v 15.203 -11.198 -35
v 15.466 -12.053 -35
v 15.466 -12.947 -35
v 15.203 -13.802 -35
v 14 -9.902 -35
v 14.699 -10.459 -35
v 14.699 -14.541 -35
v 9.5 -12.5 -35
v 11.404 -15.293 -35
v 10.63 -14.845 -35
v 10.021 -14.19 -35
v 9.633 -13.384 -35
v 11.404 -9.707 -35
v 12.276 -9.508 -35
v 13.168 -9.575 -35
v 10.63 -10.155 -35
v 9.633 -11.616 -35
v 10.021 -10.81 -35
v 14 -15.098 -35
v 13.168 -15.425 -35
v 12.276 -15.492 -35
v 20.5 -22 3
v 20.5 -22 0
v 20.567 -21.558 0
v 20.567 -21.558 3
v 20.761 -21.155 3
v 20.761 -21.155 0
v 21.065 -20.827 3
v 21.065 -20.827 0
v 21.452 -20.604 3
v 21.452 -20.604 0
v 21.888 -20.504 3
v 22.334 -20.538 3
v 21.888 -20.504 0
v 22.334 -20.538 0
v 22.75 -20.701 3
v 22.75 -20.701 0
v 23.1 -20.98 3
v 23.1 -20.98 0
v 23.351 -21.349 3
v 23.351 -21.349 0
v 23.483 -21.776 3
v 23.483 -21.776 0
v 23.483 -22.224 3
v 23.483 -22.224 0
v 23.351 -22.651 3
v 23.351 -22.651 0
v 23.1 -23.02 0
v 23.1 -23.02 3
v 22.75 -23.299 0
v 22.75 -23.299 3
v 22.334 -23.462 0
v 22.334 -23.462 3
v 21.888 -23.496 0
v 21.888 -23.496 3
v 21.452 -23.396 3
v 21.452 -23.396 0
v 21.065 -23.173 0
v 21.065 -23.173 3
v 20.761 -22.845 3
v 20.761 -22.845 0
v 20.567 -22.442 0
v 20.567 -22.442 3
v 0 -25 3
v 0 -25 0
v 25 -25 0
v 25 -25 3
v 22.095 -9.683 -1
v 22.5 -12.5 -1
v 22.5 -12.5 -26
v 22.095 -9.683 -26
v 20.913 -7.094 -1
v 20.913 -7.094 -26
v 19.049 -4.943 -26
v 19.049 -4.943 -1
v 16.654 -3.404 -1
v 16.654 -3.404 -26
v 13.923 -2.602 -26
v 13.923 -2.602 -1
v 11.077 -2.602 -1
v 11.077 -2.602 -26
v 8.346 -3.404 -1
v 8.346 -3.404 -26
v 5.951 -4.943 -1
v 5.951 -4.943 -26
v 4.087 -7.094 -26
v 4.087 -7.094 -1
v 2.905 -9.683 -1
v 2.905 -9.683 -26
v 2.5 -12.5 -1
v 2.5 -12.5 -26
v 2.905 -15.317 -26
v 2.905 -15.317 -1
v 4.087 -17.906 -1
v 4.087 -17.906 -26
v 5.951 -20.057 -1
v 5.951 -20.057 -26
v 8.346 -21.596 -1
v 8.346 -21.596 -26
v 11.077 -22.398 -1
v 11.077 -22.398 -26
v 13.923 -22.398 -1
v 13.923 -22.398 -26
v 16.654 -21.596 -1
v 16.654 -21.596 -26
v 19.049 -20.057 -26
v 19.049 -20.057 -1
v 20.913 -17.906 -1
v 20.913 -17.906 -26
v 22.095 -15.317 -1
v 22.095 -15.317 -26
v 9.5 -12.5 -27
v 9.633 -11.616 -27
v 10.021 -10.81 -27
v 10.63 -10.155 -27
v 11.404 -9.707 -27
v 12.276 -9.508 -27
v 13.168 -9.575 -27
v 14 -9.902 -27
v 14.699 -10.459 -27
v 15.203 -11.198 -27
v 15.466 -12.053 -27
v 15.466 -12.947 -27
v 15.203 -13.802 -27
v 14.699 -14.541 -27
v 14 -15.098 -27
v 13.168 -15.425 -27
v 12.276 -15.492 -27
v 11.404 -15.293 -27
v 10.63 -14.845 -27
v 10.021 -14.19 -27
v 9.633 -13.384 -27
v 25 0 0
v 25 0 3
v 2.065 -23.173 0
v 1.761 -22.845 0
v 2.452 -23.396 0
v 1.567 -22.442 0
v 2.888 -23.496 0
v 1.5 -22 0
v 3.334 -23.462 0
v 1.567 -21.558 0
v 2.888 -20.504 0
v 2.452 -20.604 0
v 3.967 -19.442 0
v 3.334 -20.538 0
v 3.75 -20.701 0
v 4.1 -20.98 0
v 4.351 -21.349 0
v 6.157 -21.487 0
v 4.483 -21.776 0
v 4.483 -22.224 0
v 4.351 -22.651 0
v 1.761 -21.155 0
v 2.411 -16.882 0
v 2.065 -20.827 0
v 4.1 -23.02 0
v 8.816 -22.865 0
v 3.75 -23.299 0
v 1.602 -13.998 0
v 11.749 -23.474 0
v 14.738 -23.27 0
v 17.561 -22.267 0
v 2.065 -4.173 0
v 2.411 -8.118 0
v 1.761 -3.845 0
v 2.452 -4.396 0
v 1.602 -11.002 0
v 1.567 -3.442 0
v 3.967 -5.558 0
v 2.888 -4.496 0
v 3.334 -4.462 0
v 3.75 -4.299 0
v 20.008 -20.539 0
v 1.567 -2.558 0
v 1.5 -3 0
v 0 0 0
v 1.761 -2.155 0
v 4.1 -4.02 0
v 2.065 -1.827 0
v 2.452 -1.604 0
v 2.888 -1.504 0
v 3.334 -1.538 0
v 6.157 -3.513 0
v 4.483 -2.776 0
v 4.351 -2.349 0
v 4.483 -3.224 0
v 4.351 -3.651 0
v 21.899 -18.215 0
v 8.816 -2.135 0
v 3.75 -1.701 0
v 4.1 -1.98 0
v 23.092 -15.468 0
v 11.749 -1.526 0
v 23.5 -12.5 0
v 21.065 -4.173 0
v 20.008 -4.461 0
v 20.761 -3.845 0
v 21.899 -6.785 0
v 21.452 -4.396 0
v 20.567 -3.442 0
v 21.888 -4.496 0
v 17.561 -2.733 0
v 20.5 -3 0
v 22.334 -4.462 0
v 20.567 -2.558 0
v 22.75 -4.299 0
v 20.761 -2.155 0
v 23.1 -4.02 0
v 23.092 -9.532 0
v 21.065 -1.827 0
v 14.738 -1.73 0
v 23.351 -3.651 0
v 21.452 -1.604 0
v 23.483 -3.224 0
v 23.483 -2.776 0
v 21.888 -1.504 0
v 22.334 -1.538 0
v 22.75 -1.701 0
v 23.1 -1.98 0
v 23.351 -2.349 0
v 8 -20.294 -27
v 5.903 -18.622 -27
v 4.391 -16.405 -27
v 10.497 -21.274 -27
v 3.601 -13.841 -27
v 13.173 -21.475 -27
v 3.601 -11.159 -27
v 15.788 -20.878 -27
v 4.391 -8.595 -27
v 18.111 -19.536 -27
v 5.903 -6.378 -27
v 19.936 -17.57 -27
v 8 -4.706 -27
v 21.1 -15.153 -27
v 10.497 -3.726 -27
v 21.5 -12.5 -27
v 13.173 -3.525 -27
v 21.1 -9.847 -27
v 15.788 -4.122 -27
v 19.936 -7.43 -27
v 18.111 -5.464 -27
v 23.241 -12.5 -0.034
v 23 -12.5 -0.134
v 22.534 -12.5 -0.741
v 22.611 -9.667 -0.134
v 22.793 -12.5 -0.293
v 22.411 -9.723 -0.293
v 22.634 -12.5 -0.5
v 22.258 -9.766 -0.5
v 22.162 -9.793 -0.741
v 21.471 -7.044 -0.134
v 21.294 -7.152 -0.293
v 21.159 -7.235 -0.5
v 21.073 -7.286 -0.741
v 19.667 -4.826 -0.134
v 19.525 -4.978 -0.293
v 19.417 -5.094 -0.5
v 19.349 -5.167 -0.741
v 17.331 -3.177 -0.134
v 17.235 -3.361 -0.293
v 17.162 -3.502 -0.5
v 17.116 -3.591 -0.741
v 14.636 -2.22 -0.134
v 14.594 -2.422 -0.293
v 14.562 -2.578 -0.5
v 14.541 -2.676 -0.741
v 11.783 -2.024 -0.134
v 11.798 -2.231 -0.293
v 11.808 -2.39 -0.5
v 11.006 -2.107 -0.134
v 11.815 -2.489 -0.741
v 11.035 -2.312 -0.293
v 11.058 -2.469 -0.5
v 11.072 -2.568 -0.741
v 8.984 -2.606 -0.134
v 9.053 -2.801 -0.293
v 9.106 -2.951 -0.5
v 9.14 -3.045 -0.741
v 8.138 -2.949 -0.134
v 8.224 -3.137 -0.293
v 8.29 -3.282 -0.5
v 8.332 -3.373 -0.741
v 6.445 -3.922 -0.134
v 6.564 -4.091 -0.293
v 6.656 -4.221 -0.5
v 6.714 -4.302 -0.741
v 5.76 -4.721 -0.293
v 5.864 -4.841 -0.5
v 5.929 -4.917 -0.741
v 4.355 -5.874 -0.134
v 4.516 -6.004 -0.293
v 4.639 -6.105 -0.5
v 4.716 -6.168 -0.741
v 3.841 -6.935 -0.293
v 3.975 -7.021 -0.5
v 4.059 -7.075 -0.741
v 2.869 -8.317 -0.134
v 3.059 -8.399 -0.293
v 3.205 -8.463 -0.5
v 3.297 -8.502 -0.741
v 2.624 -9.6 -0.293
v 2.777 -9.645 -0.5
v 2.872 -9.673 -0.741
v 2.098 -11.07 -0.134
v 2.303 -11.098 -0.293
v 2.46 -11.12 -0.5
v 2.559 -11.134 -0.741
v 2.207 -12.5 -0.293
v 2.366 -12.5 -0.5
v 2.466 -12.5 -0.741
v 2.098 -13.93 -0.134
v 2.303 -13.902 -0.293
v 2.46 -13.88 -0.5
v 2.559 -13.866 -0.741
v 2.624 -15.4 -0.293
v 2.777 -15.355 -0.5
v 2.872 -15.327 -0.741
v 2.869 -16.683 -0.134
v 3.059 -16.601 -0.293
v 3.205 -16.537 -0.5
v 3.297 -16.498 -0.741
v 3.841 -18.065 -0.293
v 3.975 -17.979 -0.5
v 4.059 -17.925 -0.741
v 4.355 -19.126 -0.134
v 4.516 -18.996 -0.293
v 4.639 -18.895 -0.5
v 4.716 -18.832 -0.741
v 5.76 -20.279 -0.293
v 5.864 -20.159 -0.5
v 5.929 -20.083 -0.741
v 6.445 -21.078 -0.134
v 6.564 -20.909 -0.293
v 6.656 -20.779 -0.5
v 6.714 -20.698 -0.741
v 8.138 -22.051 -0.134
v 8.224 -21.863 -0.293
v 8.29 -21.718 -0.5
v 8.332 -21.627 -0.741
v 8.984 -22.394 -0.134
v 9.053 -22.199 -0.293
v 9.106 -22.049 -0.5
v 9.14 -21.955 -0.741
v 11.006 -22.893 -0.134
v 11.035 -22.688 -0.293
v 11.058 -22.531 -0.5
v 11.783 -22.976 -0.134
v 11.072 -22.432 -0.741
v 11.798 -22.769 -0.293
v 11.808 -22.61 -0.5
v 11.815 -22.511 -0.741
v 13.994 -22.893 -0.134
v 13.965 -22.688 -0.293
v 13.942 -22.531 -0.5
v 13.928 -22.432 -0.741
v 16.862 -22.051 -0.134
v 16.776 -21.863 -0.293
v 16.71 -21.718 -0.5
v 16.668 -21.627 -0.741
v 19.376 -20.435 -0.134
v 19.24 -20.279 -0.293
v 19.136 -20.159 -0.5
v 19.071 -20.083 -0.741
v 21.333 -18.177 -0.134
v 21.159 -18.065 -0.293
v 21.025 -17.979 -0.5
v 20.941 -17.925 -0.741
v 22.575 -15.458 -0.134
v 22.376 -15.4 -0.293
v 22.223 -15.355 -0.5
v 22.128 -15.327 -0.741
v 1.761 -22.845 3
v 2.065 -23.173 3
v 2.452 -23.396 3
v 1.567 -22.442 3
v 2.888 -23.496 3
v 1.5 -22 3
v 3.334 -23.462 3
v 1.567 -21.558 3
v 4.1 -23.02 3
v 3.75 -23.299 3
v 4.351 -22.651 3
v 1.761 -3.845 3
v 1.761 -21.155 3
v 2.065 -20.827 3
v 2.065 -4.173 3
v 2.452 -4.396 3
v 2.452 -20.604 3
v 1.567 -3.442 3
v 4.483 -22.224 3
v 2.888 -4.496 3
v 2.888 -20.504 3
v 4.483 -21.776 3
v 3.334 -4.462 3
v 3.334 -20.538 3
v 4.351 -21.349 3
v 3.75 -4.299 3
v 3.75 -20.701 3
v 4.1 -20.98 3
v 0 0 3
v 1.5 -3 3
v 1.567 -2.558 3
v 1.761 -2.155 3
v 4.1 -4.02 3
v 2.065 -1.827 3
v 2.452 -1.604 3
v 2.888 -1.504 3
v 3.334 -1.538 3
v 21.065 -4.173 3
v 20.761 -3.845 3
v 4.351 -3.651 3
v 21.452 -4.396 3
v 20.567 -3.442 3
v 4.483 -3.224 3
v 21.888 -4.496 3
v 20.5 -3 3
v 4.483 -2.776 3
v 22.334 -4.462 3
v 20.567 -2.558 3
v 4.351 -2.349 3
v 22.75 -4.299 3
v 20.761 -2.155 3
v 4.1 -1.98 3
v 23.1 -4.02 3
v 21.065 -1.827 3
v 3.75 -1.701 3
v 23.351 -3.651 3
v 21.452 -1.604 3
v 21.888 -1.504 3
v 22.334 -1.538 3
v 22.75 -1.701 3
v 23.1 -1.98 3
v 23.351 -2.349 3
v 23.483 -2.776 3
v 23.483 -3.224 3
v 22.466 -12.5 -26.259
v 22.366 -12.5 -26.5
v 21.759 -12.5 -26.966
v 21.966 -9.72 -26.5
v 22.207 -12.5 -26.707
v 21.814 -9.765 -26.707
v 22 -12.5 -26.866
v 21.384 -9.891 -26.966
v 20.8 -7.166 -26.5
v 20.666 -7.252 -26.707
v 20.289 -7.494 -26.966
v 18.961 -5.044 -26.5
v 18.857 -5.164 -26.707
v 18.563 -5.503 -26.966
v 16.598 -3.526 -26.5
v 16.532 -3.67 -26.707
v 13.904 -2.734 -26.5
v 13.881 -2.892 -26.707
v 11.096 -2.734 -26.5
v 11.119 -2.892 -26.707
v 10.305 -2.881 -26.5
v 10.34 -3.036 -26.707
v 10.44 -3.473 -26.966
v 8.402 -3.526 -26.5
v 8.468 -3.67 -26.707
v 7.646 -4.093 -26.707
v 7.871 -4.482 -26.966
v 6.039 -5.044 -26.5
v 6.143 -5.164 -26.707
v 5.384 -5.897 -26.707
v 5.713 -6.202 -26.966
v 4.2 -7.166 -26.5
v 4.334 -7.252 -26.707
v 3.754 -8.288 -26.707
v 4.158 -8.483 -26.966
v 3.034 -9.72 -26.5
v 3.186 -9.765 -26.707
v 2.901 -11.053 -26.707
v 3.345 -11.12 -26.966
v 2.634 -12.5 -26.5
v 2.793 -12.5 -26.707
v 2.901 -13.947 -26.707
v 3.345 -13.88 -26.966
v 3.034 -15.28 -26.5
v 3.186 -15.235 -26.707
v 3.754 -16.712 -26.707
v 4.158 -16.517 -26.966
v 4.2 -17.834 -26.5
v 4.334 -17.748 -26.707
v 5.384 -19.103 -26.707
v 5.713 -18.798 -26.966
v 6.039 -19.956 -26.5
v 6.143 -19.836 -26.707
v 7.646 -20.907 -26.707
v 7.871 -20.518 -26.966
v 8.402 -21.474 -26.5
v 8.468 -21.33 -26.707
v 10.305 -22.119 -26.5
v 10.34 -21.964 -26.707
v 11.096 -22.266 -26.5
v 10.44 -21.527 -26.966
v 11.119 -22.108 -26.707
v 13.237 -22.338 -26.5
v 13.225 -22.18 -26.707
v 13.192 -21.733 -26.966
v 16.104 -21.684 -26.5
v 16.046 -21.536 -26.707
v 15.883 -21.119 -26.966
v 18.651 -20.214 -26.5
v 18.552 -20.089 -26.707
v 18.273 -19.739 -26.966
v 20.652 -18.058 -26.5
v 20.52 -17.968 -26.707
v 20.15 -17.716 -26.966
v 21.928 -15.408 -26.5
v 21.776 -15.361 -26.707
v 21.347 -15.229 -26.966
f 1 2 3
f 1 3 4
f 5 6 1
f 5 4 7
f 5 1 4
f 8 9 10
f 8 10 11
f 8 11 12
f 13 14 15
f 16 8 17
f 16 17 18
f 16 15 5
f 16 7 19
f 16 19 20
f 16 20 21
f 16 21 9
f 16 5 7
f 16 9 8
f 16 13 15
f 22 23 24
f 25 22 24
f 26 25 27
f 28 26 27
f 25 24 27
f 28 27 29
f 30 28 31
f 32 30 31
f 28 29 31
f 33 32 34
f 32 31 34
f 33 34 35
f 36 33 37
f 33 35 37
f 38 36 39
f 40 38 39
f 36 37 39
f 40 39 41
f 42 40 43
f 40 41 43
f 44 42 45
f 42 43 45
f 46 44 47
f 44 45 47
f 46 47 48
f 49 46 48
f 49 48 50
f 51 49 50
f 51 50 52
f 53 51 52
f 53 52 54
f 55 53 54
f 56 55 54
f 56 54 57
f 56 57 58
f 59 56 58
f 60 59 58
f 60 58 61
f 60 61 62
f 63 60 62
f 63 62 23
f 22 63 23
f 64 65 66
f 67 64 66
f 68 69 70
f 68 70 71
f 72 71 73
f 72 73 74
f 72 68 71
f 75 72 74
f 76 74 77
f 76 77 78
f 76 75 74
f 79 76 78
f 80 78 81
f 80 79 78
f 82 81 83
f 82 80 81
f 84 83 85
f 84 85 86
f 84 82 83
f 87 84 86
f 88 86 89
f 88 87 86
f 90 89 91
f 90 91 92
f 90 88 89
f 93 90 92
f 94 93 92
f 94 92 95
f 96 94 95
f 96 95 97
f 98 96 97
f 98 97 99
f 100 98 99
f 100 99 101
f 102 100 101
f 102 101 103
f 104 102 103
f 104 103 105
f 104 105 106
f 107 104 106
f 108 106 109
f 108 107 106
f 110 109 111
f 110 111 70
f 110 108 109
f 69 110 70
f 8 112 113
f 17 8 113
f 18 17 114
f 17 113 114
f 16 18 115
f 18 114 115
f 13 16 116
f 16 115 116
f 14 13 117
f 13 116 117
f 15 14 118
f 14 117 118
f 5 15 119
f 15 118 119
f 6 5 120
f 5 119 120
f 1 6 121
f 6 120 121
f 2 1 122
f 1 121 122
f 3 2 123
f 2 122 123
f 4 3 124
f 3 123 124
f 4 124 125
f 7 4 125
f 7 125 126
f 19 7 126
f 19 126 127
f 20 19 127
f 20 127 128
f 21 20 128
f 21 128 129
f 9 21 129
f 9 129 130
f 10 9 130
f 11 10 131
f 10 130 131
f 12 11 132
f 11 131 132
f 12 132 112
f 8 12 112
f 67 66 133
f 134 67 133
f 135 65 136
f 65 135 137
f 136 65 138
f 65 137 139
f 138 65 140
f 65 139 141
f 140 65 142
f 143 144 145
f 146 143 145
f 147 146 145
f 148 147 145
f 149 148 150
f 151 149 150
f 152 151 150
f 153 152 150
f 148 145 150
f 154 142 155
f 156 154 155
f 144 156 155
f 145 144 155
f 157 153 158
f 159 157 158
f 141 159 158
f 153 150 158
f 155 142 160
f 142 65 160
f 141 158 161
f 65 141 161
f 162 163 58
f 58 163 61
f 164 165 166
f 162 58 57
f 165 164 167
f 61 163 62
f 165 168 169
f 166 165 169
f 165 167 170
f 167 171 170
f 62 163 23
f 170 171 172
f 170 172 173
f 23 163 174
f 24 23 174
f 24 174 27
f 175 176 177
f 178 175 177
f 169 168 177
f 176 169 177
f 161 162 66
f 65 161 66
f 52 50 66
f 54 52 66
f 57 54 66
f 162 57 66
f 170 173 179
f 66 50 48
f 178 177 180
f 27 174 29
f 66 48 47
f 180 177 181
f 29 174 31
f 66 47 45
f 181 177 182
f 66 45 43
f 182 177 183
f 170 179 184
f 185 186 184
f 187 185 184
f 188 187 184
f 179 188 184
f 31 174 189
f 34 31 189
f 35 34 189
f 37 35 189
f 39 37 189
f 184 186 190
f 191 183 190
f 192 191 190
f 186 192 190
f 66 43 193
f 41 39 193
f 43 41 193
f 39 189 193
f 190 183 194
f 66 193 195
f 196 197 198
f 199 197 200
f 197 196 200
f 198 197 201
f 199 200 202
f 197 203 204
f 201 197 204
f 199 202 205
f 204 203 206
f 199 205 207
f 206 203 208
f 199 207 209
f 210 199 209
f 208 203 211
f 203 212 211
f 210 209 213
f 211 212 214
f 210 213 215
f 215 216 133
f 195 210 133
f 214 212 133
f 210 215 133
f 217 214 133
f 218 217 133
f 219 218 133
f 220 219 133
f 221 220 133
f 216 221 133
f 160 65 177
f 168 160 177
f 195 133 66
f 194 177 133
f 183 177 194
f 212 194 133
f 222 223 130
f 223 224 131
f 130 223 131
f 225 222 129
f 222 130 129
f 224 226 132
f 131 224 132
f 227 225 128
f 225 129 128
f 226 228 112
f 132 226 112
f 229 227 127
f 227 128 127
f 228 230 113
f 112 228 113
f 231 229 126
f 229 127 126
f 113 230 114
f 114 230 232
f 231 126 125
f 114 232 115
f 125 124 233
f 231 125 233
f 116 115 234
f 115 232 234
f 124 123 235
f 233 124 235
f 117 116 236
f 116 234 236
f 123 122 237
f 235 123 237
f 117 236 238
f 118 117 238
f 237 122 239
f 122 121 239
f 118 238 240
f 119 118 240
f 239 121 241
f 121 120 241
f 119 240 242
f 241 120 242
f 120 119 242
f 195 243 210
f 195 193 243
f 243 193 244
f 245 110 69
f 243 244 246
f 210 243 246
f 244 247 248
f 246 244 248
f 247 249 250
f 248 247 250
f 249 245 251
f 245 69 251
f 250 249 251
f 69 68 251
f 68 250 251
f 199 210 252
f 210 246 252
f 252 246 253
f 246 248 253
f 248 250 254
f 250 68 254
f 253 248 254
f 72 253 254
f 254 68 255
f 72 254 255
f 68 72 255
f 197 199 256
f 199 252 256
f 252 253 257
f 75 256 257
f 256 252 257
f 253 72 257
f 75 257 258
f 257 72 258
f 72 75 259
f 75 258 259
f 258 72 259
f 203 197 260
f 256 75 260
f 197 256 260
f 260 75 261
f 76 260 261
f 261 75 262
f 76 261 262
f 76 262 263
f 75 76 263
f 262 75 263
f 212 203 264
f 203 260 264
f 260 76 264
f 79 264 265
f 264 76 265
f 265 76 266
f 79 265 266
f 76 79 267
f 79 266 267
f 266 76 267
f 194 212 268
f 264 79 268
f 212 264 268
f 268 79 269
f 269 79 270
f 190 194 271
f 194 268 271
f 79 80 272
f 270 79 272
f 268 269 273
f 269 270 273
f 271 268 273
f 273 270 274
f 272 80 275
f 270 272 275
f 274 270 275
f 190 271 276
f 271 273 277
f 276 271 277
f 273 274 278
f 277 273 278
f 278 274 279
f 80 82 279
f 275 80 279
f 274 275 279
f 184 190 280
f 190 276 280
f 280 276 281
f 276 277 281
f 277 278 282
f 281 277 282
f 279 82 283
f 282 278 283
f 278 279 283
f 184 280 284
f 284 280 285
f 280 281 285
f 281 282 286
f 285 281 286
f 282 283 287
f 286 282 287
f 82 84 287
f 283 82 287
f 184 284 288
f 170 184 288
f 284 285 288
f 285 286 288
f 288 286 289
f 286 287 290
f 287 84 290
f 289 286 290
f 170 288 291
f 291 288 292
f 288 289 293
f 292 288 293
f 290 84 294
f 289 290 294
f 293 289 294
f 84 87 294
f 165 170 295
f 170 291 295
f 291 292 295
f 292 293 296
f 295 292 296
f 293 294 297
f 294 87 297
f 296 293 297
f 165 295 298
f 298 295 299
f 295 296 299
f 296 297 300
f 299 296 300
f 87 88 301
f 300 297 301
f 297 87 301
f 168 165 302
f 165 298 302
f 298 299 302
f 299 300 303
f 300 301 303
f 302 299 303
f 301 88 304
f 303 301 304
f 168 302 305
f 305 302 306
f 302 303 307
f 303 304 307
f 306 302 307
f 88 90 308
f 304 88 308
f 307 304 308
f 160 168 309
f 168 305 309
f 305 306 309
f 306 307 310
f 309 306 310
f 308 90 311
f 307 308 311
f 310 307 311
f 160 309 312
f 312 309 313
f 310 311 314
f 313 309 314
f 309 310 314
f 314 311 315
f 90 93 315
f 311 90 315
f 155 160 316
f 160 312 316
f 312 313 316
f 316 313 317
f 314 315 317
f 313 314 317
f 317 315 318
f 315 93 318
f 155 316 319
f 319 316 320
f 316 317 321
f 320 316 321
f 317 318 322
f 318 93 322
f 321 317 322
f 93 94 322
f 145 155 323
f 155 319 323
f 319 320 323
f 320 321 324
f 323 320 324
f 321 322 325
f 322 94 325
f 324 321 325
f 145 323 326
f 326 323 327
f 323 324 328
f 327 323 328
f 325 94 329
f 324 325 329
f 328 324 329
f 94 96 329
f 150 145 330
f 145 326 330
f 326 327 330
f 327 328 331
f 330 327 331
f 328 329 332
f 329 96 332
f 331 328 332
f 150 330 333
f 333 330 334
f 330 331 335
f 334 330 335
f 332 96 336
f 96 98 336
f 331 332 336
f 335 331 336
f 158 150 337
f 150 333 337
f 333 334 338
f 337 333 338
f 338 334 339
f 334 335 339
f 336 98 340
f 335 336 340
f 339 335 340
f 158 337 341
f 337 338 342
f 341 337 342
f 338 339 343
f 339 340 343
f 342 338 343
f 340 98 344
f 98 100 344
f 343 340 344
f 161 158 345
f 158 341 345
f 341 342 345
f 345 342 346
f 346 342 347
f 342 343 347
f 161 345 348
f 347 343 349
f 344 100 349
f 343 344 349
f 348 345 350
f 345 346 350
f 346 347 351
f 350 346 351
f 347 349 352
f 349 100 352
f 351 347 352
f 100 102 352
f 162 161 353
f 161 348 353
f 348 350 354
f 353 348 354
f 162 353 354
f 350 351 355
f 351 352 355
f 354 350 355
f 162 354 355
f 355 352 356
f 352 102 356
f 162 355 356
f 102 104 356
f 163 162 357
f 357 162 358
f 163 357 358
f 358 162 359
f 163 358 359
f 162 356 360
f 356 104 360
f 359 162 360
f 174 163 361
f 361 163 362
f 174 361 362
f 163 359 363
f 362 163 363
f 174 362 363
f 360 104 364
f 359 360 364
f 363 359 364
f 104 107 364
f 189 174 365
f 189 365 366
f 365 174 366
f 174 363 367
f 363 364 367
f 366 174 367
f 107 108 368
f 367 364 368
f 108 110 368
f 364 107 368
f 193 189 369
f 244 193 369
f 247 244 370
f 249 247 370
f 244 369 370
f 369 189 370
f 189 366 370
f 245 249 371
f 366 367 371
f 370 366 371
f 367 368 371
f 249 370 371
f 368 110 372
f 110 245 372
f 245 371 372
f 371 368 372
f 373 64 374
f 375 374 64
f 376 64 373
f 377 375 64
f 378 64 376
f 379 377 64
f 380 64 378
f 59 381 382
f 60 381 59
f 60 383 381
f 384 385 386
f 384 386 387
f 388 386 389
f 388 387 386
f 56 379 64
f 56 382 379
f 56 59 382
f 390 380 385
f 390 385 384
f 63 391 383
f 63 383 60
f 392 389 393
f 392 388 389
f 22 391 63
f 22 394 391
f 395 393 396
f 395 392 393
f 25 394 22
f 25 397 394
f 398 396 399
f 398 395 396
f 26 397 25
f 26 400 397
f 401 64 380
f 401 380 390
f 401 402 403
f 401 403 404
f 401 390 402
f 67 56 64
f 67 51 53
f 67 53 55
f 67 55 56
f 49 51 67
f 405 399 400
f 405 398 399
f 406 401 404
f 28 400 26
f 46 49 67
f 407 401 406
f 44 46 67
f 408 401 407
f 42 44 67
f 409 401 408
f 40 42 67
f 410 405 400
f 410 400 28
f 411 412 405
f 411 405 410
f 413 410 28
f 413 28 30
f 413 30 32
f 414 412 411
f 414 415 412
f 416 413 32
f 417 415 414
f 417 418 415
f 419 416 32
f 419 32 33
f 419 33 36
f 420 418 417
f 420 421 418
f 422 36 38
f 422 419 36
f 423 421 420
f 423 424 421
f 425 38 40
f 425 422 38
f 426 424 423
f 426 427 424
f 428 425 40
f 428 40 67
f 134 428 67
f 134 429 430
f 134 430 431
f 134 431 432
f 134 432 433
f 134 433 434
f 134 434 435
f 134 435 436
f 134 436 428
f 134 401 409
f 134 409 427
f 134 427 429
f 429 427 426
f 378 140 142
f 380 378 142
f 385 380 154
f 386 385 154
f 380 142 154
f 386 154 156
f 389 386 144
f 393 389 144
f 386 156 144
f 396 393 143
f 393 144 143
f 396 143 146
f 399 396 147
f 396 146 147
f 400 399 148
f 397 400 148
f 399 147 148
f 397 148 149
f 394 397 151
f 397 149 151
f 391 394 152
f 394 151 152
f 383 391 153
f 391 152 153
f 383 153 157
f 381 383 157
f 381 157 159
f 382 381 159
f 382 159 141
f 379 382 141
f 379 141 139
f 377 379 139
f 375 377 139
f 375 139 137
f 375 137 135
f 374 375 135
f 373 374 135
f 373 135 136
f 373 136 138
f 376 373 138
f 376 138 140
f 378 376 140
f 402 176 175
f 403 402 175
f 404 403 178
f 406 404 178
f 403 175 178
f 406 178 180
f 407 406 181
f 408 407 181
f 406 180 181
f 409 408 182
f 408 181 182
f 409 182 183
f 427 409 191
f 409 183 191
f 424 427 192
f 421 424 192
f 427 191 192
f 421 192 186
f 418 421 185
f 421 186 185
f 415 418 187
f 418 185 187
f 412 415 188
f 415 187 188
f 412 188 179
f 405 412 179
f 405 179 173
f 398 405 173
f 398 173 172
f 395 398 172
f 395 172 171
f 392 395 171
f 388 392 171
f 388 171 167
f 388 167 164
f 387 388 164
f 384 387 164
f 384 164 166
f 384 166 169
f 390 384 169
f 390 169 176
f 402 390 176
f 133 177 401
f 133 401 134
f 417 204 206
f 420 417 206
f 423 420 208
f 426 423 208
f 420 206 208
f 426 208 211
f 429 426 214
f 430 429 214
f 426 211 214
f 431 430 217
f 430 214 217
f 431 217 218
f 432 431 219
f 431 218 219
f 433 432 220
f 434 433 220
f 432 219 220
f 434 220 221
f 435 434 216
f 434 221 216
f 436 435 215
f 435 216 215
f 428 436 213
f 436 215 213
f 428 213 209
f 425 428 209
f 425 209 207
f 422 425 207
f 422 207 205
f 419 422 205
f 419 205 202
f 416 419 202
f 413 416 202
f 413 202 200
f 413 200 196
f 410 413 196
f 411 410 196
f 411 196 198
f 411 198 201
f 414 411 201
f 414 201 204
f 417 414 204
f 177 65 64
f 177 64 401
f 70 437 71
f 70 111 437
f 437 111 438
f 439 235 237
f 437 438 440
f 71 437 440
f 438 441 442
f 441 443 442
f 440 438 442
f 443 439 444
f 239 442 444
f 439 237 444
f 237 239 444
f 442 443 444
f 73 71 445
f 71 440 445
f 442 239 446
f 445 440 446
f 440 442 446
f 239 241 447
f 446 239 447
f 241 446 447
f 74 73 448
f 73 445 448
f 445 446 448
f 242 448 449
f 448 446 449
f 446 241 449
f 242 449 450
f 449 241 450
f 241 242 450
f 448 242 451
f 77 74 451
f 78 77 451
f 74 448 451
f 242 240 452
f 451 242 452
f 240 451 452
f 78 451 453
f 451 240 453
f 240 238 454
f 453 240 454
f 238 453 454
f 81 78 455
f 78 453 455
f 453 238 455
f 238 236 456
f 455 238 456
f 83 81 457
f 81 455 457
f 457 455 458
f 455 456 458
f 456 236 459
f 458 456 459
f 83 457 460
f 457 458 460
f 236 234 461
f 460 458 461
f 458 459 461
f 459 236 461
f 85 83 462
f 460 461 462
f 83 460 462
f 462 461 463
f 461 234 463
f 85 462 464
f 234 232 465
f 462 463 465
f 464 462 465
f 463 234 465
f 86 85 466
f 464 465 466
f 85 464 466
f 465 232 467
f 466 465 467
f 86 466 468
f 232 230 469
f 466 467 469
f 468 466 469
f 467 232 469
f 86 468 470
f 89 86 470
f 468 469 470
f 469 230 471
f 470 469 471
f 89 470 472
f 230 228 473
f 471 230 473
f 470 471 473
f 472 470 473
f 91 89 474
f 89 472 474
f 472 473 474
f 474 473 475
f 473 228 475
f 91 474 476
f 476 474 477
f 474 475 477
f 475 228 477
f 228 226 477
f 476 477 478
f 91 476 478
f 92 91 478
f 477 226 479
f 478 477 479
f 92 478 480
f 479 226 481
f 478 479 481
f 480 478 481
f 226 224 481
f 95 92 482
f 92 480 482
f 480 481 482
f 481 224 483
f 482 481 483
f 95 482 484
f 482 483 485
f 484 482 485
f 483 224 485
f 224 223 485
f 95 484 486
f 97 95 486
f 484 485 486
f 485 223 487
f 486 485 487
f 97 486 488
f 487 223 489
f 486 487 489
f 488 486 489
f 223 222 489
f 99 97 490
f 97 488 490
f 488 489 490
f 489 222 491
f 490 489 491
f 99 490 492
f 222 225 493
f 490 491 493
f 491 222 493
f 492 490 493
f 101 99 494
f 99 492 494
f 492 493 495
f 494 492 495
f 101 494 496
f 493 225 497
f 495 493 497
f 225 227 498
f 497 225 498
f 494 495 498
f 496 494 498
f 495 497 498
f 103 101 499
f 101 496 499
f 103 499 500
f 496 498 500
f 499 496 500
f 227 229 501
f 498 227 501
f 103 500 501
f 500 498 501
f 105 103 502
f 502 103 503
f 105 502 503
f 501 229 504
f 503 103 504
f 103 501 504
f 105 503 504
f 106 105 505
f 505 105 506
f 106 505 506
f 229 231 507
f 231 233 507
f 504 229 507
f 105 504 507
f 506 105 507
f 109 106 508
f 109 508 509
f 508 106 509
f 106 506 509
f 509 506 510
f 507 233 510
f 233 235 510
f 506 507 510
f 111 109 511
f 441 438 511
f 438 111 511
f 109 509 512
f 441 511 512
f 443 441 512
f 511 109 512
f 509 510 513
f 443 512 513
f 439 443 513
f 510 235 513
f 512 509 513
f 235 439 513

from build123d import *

# Parameters (mm, degrees)
SKETCH_2_W          = 25
SKETCH_2_H          = 25
EXTRUDE_1_DEPTH     = 3
SKETCH_3_R          = 1.5
CUT_EXTRUDE_2_DEPTH = 4
EXTRUDE_START       = -3
SKETCH_4_R          = 10
EXTRUDE_2_DEPTH     = 27
SKETCH_5_R          = 3
EXTRUDE_3_DEPTH     = 8
FILLET_3_R          = 1


with BuildPart() as part:
    # 草图2 → 凸台-拉伸1 (new body)
    with BuildSketch(Plane.XY):
        with Locations((12.5, -12.5)):
            Rectangle(SKETCH_2_W, SKETCH_2_H)
    extrude(amount=EXTRUDE_1_DEPTH)

    # 草图3 → 切除-拉伸2 (cut, through all)
    with BuildSketch(Plane(origin=(0, 0, 0), x_dir=(-1, 0, 0), z_dir=(0, 0, -1))):
        with Locations((-22, -3)):
            Circle(SKETCH_3_R)
        with Locations((-3, -3)):
            Circle(SKETCH_3_R)
        with Locations((-3, -22)):
            Circle(SKETCH_3_R)
        with Locations((-22, -22)):
            Circle(SKETCH_3_R)
    extrude(amount=-CUT_EXTRUDE_2_DEPTH, mode=Mode.SUBTRACT)

    # 草图4 → 凸台-拉伸2 (add)
    with BuildSketch(Plane.XY.offset(3).offset(EXTRUDE_START)):
        with Locations((12.5, -12.5)):
            Circle(SKETCH_4_R)
    extrude(amount=-EXTRUDE_2_DEPTH)

    # 草图5 → 凸台-拉伸3 (add)
    with BuildSketch(Plane(origin=(0, 0, -27), x_dir=(-1, 0, 0), z_dir=(0, 0, -1))):
        with Locations((-12.5, -12.5)):
            Circle(SKETCH_5_R)
    extrude(amount=EXTRUDE_3_DEPTH)

    # 圆角3
    fillet_3_edges = [part.edges().sort_by_distance(p)[0] for p in [
        (2.5, -12.5, -27),
        (2.5, -12.5, 0),
    ]]
    fillet(fillet_3_edges, radius=FILLET_3_R)


solid = part.part
